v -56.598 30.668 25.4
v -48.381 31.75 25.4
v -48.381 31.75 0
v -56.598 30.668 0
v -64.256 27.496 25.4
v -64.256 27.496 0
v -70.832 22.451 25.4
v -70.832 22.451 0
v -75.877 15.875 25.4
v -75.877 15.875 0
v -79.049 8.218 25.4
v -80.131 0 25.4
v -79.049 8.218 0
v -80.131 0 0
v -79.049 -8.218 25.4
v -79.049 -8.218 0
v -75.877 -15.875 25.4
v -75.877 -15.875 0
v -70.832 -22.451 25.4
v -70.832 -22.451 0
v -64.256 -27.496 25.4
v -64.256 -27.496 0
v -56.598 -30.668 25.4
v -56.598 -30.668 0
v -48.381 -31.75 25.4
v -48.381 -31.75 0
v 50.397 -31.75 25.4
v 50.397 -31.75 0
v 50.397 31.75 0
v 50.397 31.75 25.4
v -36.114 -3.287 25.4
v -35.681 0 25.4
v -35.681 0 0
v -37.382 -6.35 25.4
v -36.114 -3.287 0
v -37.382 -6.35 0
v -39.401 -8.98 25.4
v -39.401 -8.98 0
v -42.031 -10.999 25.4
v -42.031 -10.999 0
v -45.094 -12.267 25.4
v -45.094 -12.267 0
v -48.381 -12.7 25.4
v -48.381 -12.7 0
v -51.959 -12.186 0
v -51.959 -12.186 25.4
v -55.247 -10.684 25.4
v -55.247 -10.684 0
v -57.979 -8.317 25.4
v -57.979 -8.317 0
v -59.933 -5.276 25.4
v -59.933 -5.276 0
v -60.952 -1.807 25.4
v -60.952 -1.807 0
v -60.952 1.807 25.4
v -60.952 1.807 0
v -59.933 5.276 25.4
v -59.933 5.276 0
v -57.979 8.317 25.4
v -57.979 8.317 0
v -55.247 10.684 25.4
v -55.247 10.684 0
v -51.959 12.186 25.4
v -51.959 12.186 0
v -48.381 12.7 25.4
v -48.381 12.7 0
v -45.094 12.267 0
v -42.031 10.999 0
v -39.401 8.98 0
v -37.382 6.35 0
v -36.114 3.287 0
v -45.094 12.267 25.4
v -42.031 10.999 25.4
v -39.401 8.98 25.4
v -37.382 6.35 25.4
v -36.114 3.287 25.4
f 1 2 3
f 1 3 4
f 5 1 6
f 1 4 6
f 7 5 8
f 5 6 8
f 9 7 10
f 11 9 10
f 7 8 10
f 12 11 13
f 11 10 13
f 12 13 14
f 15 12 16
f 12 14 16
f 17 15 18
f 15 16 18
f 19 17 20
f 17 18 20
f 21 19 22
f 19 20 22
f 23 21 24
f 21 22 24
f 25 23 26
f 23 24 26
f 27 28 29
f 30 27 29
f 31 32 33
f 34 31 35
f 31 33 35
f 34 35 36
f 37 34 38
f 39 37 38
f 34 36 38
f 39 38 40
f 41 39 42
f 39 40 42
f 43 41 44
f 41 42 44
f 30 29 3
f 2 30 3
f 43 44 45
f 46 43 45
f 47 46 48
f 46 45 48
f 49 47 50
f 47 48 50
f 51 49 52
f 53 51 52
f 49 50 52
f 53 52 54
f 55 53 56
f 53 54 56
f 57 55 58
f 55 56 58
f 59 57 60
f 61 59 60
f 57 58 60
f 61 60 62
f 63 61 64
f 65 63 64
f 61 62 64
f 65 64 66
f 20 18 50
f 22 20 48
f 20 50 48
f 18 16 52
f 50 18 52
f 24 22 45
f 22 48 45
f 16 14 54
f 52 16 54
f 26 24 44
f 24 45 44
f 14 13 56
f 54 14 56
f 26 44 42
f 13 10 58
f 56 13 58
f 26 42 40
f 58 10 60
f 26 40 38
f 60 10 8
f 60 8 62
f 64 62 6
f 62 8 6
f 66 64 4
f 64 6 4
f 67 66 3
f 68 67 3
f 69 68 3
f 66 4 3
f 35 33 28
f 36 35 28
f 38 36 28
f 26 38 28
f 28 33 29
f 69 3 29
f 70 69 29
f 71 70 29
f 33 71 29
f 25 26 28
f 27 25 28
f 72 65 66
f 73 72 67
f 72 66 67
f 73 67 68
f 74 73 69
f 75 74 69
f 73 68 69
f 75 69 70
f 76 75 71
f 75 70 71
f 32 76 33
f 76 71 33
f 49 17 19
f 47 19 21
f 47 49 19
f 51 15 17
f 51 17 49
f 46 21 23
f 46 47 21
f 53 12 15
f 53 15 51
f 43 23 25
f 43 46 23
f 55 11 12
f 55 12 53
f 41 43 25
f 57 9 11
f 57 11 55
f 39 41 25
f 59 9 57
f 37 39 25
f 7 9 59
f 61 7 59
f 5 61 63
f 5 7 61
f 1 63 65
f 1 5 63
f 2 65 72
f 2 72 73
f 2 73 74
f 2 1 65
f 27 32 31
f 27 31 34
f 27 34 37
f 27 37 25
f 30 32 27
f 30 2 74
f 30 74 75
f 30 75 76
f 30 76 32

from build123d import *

# Parameters (mm, degrees)
F1_DEPTH = 25.4


with BuildPart() as f1:
    # F0 (on Top) → F1 (new body)
    with BuildSketch(Plane.XY):
        with BuildLine():
            ThreePointArc((-16.6309525629, 0), (-25.9303122603, 22.4506403027), (-48.3809525629, 31.75))
            Line((-48.3809525629, 31.75), (-48.3809525629, 12.7))
            ThreePointArc((-48.3809525629, 12.7), (-39.4006964419, 8.9802561211), (-35.6809525629, 0))
            ThreePointArc((-35.6809525629, 0), (-39.4006964419, -8.9802561211), (-48.3809525629, -12.7))
            Line((-48.3809525629, -12.7), (-48.3809525629, -31.75))
            ThreePointArc((-48.3809525629, -31.75), (-25.9303122603, -22.4506403027), (-16.6309525629, 0))
        make_face()
        with BuildLine():
            Line((50.3968245514, 31.75), (-48.3809525629, 31.75))
            ThreePointArc((-48.3809525629, 31.75), (-25.9303122603, 22.4506403027), (-16.6309525629, 0))
            ThreePointArc((-16.6309525629, 0), (-25.9303122603, -22.4506403027), (-48.3809525629, -31.75))
            Line((-48.3809525629, -31.75), (50.3968245514, -31.75))
            Line((50.3968245514, -31.75), (50.3968245514, 31.75))
        make_face()
        with BuildLine():
            Line((-48.3809525629, 12.7), (-48.3809525629, 31.75))
            ThreePointArc((-48.3809525629, 31.75), (-80.1309525629, 0), (-48.3809525629, -31.75))
            Line((-48.3809525629, -31.75), (-48.3809525629, -12.7))
            ThreePointArc((-48.3809525629, -12.7), (-61.0809525629, 0), (-48.3809525629, 12.7))
        make_face()
    extrude(amount=F1_DEPTH)


solid = f1.part
